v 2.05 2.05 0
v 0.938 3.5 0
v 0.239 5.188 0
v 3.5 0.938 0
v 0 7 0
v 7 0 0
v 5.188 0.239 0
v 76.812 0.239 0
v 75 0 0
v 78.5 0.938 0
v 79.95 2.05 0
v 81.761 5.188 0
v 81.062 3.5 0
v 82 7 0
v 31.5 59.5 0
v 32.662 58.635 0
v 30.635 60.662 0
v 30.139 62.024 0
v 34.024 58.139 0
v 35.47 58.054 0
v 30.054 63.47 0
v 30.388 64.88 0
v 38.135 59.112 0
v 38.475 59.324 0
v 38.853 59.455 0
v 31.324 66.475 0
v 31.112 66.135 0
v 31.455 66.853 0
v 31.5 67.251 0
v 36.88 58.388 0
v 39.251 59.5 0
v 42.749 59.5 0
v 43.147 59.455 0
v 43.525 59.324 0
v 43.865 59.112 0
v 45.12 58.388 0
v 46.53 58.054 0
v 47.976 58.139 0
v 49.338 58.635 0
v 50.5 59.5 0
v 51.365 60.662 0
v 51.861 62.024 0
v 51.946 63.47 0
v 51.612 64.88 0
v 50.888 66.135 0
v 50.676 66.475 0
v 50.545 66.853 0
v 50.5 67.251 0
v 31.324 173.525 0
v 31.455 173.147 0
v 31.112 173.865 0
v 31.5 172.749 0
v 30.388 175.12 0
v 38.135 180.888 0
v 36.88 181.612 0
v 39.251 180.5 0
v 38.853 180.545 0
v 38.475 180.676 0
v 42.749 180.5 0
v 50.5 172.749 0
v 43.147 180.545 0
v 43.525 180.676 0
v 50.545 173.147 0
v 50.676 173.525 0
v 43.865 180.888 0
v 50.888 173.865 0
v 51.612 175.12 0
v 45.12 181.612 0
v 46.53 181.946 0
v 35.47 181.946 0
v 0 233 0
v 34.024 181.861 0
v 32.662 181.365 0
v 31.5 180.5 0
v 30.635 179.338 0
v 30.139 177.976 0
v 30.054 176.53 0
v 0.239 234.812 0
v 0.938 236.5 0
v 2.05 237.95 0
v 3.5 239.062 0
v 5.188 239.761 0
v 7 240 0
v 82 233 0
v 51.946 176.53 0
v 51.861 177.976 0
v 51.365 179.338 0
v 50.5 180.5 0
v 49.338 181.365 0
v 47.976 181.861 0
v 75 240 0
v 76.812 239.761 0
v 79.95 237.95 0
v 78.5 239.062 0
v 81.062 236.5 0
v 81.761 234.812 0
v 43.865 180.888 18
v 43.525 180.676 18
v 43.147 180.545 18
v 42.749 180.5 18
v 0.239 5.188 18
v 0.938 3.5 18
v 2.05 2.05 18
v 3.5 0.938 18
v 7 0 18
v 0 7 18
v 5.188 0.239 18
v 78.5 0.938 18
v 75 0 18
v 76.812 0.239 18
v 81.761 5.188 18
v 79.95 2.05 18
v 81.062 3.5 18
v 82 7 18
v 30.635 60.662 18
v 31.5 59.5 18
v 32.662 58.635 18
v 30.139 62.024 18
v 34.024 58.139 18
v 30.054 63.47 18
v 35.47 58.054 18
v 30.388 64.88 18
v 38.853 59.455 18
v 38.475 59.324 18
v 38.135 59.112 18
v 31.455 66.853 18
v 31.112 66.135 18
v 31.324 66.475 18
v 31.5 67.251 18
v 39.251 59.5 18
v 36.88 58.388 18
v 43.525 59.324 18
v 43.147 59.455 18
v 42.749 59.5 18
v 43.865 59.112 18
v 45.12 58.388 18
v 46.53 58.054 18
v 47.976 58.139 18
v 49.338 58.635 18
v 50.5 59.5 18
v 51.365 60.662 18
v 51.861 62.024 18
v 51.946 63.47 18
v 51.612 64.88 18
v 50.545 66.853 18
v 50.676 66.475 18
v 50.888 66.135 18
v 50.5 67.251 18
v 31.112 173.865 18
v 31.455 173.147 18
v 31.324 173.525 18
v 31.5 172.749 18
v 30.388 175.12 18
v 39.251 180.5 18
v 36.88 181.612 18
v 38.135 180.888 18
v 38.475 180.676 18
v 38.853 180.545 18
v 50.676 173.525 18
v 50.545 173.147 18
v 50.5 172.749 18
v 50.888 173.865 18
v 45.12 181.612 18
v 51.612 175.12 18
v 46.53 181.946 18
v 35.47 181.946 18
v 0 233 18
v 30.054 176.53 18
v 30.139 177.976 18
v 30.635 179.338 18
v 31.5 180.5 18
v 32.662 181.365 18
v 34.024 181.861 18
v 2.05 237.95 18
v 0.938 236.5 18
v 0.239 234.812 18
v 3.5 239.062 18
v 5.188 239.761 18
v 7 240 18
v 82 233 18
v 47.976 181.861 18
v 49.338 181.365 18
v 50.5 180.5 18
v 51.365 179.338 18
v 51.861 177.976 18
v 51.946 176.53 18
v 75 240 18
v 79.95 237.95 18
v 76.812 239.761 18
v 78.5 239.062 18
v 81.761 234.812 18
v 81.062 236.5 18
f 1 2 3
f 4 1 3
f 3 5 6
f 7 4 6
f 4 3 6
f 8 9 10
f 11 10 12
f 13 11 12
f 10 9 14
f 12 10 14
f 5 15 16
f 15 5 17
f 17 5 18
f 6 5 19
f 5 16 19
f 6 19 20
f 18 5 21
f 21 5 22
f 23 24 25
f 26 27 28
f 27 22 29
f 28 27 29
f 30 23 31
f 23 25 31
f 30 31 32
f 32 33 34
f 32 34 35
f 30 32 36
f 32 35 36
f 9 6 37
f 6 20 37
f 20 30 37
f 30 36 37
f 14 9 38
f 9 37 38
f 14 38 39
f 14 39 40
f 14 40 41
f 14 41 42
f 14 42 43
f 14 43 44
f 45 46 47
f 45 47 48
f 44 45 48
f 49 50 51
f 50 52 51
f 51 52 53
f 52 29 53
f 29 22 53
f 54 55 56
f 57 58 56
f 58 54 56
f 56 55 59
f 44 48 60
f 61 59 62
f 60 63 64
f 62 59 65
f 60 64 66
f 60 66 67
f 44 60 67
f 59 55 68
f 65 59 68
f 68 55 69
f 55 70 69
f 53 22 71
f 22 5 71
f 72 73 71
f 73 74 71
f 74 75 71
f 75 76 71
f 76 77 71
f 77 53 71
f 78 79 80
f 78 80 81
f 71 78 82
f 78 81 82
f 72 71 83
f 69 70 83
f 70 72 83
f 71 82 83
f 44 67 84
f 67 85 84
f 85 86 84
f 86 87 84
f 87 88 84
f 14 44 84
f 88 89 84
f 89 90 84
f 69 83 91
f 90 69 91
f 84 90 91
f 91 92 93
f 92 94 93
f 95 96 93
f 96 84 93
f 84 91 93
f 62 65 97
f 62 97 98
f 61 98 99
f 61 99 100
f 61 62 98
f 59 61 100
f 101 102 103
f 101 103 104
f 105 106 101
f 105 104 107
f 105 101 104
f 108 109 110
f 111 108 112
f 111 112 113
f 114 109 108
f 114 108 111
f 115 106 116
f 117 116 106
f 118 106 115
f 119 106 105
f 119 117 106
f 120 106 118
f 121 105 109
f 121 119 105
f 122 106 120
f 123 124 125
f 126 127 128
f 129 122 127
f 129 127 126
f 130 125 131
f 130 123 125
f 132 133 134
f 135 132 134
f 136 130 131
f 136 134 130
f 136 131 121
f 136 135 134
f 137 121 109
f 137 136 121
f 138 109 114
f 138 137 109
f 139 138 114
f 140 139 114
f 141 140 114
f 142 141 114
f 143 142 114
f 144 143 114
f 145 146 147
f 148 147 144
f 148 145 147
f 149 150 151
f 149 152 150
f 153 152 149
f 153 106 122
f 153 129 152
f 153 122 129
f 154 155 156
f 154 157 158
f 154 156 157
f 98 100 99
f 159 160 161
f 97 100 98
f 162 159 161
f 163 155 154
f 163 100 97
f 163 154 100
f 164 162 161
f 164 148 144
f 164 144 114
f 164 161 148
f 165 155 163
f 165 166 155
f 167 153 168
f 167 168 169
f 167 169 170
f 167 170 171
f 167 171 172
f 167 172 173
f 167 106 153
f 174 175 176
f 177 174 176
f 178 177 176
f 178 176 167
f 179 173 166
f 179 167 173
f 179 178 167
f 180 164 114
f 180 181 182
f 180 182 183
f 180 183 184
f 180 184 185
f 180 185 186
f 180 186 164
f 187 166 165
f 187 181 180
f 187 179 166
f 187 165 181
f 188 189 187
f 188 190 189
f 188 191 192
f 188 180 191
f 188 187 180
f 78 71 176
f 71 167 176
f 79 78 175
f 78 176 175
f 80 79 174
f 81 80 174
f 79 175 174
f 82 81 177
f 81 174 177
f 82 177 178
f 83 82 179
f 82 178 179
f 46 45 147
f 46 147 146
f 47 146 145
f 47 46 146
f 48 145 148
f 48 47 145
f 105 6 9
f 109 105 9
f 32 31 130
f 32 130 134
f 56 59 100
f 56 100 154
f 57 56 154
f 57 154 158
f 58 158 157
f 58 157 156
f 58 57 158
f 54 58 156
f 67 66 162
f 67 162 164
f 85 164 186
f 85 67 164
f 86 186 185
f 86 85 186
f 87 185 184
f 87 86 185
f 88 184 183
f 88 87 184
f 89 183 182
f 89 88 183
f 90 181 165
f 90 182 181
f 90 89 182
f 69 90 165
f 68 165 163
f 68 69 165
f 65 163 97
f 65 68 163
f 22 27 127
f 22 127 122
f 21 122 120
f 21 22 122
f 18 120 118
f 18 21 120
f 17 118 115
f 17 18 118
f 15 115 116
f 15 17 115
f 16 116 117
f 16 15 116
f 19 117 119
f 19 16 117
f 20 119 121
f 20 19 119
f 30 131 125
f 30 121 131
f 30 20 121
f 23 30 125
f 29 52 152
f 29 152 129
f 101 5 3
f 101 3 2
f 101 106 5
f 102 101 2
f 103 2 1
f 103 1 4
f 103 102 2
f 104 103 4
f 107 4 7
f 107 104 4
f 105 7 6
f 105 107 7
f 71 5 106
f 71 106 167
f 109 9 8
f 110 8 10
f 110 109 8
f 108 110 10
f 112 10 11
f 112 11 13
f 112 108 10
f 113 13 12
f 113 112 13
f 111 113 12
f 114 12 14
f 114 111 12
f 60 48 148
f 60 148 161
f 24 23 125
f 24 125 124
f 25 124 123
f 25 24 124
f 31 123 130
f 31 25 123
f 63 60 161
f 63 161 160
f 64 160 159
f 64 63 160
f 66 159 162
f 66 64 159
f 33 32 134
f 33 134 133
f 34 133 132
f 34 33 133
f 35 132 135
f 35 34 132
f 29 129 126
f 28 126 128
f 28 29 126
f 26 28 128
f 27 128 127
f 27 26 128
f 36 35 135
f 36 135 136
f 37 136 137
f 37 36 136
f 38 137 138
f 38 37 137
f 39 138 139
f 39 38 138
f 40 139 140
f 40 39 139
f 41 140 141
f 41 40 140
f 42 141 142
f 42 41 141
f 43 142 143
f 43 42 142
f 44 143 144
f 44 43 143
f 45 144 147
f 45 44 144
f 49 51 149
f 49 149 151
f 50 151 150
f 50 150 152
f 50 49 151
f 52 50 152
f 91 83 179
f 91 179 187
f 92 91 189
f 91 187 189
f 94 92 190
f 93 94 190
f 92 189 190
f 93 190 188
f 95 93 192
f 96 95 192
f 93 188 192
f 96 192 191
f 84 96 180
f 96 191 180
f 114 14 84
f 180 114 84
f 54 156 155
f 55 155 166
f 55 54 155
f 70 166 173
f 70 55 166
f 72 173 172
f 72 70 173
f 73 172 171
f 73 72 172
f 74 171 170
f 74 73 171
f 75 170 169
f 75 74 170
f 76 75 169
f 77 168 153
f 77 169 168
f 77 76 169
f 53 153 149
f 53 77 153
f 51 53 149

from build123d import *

# Parameters (mm, degrees)
SKETCH1_W           = 82
SKETCH1_H           = 240
BOSS_EXTRUDE1_DEPTH = 18
CUT_EXTRUDE1_DEPTH  = 19
FILLET1_R           = 7


with BuildPart() as part:
    # Sketch1 → Boss-Extrude1 (new body)
    with BuildSketch(Plane.XY):
        with Locations((41, 120)):
            Rectangle(SKETCH1_W, SKETCH1_H)
    extrude(amount=BOSS_EXTRUDE1_DEPTH)

    # Sketch2 → Cut-Extrude1 (cut, through all)
    with BuildSketch(Plane.XY):
        with BuildLine():
            Line((39.251228148, 59.5), (42.748771852, 59.5))
            ThreePointArc((42.748771852, 59.5), (43.339438857, 59.400327171), (43.864690916, 59.11234721))
            ThreePointArc((43.864690916, 59.11234721), (50.5, 59.5), (50.88765279, 66.135309084))
            ThreePointArc((50.88765279, 66.135309084), (50.599672829, 66.660561143), (50.5, 67.251228148))
            Line((50.5, 67.251228148), (50.5, 172.748771852))
            ThreePointArc((50.5, 172.748771852), (50.599672829, 173.339438857), (50.88765279, 173.864690916))
            ThreePointArc((50.88765279, 173.864690916), (50.5, 180.5), (43.864690916, 180.88765279))
            ThreePointArc((43.864690916, 180.88765279), (43.339438857, 180.599672829), (42.748771852, 180.5))
            Line((42.748771852, 180.5), (39.251228148, 180.5))
            ThreePointArc((39.251228148, 180.5), (38.660561143, 180.599672829), (38.135309084, 180.88765279))
            ThreePointArc((38.135309084, 180.88765279), (31.5, 180.5), (31.11234721, 173.864690916))
            ThreePointArc((31.11234721, 173.864690916), (31.400327171, 173.339438857), (31.5, 172.748771852))
            Line((31.5, 172.748771852), (31.5, 67.251228148))
            ThreePointArc((31.5, 67.251228148), (31.400327171, 66.660561143), (31.11234721, 66.135309084))
            ThreePointArc((31.11234721, 66.135309084), (31.5, 59.5), (38.135309084, 59.11234721))
            ThreePointArc((38.135309084, 59.11234721), (38.660561143, 59.400327171), (39.251228148, 59.5))
        make_face()
    extrude(amount=CUT_EXTRUDE1_DEPTH, mode=Mode.SUBTRACT)

    # Fillet1
    fillet1_edges = [part.edges().sort_by_distance(p)[0] for p in [
        (0, 240, 9),
        (82, 240, 9),
        (82, 0, 9),
        (0, 0, 9),
    ]]
    fillet(fillet1_edges, radius=FILLET1_R)


solid = part.part
